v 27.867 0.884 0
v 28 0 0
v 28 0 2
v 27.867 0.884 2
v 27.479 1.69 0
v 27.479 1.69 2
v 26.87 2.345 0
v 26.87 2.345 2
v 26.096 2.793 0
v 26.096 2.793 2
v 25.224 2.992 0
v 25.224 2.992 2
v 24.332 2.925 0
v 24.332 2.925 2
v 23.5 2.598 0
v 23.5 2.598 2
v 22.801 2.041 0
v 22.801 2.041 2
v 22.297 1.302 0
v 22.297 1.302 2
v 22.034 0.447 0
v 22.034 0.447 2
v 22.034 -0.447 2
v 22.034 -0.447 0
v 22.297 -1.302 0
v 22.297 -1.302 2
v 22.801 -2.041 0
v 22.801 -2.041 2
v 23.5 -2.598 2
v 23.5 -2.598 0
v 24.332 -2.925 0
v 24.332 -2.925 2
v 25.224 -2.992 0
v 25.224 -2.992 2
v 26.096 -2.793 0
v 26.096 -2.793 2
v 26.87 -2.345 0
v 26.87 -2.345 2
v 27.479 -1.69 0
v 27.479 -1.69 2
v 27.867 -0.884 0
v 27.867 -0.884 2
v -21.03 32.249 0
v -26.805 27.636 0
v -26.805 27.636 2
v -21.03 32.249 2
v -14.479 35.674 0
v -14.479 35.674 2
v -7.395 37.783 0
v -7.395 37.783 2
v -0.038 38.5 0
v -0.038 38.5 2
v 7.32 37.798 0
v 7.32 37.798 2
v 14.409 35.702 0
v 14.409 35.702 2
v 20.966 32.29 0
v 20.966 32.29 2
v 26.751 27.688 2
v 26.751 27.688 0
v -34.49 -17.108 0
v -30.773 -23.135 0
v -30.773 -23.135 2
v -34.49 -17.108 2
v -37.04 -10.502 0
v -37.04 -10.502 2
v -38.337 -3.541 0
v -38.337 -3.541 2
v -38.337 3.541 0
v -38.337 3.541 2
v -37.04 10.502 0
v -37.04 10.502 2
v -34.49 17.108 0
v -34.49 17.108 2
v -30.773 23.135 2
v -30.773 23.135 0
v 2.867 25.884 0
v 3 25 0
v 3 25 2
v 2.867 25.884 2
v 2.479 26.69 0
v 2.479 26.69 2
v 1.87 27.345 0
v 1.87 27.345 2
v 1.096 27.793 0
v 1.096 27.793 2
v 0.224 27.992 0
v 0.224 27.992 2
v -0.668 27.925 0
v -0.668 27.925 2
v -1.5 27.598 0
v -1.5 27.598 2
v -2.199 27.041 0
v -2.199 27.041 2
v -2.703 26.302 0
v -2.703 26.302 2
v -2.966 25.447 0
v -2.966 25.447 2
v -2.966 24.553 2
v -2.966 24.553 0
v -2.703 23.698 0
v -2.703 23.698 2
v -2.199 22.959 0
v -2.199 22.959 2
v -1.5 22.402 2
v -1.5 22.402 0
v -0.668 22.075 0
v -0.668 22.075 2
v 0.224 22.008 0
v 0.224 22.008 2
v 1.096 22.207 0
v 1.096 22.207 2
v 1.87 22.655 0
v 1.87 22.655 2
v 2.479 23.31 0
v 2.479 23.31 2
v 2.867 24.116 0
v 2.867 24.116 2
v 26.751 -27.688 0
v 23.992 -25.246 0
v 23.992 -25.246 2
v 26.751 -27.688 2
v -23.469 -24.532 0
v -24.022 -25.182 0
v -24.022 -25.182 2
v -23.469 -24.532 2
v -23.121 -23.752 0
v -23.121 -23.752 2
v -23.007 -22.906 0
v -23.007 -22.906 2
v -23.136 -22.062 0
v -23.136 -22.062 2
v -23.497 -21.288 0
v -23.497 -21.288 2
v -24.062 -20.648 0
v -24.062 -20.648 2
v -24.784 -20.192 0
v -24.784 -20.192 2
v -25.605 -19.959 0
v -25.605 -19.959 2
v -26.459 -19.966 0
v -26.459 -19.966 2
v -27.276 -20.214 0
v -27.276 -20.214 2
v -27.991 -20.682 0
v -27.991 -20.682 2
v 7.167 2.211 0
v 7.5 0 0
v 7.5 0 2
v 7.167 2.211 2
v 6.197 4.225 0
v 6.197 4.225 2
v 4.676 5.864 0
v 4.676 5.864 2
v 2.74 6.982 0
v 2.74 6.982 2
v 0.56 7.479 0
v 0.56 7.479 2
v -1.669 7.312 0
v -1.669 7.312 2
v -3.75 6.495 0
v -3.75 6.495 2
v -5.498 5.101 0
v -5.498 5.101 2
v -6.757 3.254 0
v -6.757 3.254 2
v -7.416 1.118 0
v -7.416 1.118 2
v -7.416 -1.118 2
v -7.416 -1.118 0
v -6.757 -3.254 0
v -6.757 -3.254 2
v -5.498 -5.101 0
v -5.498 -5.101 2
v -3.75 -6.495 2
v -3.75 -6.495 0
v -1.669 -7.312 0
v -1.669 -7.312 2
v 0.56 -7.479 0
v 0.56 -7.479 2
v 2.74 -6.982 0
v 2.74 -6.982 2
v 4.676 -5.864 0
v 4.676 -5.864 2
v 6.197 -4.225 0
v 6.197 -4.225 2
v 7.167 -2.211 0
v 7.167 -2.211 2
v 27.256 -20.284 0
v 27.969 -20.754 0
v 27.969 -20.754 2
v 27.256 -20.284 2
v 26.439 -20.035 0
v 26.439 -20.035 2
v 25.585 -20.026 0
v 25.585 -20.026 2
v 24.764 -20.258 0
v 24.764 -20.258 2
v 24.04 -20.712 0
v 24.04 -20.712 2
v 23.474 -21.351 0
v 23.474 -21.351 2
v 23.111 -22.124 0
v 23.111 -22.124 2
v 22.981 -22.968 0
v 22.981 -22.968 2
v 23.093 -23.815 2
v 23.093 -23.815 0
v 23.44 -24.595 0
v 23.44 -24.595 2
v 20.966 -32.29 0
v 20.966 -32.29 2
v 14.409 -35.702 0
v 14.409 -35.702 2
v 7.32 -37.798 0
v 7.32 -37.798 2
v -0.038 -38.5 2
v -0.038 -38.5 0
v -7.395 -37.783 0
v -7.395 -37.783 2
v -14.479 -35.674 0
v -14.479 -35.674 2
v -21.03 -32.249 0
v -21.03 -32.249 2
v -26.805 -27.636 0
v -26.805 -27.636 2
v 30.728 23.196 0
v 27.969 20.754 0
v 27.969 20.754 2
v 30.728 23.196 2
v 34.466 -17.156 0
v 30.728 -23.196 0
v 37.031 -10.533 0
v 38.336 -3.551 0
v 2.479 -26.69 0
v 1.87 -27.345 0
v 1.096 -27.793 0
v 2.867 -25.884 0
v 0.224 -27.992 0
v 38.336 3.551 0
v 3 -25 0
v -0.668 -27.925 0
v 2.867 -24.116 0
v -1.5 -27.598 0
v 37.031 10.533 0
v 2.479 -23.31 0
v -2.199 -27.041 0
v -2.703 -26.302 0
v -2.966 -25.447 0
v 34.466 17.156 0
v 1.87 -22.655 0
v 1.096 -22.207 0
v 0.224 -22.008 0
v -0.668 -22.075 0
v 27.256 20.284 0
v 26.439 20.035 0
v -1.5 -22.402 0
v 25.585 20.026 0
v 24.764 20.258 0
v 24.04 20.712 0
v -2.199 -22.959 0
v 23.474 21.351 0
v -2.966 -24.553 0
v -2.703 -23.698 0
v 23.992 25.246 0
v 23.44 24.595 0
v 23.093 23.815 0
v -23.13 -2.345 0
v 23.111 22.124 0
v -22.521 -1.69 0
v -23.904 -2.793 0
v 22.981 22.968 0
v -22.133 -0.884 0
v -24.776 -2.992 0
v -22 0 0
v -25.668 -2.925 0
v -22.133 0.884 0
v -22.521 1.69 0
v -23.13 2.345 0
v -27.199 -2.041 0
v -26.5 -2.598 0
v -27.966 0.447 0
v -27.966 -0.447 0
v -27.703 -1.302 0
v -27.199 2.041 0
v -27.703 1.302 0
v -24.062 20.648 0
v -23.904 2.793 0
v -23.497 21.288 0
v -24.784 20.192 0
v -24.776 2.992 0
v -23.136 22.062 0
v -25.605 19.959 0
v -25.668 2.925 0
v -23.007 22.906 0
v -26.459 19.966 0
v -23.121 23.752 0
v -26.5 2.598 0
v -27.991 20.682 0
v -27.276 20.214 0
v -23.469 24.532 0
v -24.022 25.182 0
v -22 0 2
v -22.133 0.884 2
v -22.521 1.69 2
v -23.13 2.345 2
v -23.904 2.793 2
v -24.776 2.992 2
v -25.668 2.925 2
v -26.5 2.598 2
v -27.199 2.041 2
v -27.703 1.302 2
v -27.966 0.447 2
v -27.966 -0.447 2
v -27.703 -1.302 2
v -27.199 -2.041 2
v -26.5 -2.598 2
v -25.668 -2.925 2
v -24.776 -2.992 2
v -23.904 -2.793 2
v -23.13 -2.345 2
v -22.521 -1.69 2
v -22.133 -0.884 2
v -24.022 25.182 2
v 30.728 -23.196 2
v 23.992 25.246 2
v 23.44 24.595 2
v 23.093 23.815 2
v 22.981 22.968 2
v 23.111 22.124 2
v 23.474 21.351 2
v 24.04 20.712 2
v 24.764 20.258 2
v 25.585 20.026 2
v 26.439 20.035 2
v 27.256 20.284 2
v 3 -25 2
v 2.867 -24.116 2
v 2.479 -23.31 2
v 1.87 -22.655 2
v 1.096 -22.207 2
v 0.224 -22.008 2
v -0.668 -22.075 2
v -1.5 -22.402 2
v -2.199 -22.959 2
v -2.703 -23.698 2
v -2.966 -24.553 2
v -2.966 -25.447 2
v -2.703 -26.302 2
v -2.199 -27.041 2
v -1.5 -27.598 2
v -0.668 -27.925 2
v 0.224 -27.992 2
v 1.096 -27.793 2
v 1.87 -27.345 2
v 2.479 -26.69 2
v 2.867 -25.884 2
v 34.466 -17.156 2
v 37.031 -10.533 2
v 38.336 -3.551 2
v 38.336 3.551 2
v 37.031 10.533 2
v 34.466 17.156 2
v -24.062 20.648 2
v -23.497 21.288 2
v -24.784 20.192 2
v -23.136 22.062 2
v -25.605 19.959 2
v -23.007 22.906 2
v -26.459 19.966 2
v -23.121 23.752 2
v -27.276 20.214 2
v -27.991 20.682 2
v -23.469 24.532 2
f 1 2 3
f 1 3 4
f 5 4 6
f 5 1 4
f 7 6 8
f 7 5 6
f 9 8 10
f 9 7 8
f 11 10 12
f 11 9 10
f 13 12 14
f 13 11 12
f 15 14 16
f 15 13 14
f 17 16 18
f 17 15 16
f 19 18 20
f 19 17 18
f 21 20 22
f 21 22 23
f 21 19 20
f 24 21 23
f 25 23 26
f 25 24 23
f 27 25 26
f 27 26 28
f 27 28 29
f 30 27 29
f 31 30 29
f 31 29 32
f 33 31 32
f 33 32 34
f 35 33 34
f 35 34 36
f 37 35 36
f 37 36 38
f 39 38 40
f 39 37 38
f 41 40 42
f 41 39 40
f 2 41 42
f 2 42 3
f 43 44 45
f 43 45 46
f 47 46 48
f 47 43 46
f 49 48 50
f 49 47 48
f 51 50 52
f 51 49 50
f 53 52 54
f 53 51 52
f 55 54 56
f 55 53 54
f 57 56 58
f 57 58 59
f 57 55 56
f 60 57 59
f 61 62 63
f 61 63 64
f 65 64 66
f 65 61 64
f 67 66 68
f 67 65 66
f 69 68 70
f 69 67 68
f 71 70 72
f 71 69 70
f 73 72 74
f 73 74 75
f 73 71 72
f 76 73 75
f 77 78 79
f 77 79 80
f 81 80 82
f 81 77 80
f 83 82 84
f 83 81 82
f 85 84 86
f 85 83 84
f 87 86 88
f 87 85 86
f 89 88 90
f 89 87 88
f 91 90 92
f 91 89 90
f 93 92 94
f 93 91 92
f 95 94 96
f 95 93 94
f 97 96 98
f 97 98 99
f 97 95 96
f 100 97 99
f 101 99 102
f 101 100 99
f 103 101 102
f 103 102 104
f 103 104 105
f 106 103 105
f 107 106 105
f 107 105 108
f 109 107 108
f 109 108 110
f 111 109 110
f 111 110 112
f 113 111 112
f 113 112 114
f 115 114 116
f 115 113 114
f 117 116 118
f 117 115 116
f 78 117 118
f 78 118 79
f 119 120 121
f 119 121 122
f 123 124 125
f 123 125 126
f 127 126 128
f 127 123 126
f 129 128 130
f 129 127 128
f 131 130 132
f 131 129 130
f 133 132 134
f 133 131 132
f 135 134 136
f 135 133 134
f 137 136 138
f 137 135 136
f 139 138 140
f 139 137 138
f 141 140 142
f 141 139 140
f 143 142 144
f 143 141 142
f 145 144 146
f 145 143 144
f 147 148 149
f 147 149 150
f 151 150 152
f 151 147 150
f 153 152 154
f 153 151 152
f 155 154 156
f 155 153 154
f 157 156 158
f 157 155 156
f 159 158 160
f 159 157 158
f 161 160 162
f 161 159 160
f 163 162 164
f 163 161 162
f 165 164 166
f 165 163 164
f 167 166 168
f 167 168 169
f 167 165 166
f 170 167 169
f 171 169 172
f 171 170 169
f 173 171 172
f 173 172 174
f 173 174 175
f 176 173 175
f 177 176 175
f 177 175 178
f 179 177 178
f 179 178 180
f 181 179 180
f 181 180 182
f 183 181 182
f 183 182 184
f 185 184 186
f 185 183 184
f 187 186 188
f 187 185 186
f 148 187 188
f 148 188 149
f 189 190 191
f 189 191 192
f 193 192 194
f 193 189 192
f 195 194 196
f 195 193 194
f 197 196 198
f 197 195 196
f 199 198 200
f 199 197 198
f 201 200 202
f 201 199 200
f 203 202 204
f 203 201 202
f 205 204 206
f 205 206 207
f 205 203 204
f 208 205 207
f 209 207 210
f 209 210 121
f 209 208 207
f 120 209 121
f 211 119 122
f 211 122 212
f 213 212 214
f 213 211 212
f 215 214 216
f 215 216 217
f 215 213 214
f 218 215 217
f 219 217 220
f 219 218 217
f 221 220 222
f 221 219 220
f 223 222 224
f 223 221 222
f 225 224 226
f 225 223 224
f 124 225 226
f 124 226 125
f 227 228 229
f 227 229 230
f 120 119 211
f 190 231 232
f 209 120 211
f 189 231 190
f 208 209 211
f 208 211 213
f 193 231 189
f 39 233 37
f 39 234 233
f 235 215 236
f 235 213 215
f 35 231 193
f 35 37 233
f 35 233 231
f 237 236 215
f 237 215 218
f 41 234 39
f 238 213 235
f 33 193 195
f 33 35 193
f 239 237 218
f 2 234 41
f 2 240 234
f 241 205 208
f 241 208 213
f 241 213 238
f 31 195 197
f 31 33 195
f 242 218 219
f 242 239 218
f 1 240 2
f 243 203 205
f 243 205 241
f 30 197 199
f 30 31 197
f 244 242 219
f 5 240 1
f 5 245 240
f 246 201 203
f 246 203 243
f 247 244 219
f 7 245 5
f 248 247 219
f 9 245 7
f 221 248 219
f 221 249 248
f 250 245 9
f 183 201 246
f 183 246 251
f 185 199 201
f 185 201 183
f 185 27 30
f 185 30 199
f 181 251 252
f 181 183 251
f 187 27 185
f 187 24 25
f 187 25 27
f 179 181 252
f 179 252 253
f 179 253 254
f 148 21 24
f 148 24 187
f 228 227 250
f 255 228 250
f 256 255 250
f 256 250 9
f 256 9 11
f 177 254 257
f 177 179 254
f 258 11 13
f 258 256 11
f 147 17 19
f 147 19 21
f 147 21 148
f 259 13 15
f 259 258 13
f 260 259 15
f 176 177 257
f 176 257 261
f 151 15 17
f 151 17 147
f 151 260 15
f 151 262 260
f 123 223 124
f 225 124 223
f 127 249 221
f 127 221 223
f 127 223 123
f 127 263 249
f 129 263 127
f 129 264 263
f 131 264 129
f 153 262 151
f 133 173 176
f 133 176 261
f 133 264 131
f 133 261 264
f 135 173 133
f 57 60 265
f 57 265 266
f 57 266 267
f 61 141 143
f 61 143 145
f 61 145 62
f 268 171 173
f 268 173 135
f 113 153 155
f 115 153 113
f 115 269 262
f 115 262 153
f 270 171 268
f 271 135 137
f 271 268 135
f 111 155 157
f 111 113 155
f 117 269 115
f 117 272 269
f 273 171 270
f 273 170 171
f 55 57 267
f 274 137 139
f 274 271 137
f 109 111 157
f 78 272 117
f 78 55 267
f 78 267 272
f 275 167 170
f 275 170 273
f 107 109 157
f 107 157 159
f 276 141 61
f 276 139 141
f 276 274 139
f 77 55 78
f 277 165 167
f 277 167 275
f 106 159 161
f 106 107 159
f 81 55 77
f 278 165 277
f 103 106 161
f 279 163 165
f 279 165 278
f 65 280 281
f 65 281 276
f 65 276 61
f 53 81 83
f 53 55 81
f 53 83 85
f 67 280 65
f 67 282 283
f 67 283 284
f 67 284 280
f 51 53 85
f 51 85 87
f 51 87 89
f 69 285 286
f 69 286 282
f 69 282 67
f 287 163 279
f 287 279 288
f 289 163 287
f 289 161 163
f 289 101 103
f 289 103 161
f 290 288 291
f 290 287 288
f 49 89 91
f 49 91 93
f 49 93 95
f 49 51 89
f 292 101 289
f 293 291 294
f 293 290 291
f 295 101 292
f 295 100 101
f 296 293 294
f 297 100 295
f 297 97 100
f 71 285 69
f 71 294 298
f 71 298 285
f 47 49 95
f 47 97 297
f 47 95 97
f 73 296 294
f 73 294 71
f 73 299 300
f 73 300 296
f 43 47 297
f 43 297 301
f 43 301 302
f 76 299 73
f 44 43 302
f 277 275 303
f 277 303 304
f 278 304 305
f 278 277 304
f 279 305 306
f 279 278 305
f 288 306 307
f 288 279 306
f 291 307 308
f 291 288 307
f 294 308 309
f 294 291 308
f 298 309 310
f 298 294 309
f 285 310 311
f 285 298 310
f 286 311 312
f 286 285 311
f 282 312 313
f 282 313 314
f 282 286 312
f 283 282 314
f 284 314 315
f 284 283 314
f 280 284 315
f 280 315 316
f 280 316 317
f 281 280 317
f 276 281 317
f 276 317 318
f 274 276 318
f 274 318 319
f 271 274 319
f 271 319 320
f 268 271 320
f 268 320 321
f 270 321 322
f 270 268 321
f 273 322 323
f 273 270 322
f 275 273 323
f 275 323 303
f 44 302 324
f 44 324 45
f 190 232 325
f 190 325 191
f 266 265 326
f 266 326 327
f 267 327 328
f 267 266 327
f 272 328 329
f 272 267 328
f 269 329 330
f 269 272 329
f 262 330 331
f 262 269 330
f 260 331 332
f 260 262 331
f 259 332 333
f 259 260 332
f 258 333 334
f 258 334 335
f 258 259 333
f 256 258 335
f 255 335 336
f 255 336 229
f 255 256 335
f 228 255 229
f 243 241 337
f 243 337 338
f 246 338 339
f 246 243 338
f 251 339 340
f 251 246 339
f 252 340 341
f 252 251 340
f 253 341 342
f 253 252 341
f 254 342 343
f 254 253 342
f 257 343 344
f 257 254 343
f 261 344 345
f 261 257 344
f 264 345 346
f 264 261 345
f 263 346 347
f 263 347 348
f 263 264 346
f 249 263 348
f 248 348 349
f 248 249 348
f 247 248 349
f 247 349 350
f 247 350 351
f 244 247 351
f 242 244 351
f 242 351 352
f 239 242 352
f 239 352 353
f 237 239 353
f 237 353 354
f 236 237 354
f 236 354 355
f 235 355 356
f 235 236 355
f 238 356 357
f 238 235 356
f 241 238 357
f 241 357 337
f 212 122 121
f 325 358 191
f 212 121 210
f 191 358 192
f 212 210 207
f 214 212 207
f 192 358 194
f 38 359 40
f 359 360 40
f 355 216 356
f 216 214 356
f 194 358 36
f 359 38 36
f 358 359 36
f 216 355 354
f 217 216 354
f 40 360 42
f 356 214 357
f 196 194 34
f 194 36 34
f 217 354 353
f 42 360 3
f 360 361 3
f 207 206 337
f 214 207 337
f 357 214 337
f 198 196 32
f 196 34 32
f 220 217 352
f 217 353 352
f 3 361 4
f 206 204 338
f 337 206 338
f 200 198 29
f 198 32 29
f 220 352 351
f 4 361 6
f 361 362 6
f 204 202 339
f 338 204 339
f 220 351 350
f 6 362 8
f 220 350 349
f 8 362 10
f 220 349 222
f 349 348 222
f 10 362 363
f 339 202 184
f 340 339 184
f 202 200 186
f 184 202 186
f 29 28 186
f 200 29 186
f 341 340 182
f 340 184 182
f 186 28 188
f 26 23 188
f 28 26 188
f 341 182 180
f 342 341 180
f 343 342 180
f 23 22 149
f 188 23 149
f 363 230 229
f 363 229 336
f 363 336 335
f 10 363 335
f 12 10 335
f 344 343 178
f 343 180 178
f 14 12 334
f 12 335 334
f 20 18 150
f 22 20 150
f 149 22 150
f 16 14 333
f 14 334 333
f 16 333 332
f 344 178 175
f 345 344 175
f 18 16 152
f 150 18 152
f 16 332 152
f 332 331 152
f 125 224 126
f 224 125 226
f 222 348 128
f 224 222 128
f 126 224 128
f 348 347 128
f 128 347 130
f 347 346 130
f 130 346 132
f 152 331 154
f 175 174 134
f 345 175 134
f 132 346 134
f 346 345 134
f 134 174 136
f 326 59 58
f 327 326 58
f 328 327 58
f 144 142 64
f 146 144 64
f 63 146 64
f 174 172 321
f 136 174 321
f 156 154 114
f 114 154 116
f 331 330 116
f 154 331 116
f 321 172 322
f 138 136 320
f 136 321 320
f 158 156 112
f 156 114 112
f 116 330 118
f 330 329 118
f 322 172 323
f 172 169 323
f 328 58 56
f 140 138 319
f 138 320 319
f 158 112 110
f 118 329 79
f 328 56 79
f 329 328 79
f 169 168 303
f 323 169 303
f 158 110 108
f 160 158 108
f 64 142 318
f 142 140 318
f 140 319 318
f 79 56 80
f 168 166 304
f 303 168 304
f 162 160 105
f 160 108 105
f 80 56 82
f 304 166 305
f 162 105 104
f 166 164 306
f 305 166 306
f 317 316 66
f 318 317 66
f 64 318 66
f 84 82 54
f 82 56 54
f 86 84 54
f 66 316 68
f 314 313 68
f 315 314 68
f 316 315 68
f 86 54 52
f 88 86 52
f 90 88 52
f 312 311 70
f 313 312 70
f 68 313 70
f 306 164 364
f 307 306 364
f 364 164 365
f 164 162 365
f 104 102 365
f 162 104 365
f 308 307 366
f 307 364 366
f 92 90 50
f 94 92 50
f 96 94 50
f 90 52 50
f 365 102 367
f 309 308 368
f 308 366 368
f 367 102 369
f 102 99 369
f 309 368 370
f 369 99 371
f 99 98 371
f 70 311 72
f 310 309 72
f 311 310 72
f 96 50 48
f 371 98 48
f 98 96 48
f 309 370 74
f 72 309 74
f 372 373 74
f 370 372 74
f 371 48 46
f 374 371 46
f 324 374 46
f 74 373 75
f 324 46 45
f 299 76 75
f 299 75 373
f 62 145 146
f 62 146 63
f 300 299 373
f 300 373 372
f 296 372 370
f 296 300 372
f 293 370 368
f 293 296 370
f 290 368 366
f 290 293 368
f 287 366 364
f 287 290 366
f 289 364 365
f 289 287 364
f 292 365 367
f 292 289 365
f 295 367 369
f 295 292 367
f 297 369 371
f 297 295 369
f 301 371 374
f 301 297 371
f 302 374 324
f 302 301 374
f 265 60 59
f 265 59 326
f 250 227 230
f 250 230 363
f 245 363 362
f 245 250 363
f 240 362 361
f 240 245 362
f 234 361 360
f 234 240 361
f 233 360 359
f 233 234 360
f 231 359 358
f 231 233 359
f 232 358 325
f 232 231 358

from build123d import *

# Parameters (mm, degrees)
MODEL_R             = 7.5
MODEL_R_2           = 3
BOSS_EXTRUDE1_DEPTH = 2


with BuildPart() as part:
    # Model → Boss-Extrude1 (new body)
    with BuildSketch(Plane.XY):
        with BuildLine():
            Line((30.727892071, -23.195832576), (27.969309055, -20.753740651))
            ThreePointArc((27.969309055, -20.753740651), (23.734502764, -21.011453059), (23.992215172, -25.246259349))
            Line((23.992215172, -25.246259349), (26.750798188, -27.688351274))
            ThreePointArc((26.750798188, -27.688351274), (-0.037885337, -38.49998136), (-26.805238954, -27.635650248))
            Line((-26.805238954, -27.635650248), (-24.022447477, -25.18187917))
            ThreePointArc((-24.022447477, -25.18187917), (-23.756401179, -20.947588277), (-27.990692072, -20.68154198))
            Line((-27.990692072, -20.68154198), (-30.773483549, -23.135313057))
            ThreePointArc((-30.773483549, -23.135313057), (-38.5, 0), (-30.773483549, 23.135313057))
            Line((-30.773483549, 23.135313057), (-27.990692072, 20.68154198))
            ThreePointArc((-27.990692072, 20.68154198), (-23.756401179, 20.947588277), (-24.022447477, 25.18187917))
            Line((-24.022447477, 25.18187917), (-26.805238954, 27.635650248))
            ThreePointArc((-26.805238954, 27.635650248), (-0.037885337, 38.49998136), (26.750798188, 27.688351274))
            Line((26.750798188, 27.688351274), (23.992215172, 25.246259349))
            ThreePointArc((23.992215172, 25.246259349), (23.734502764, 21.011453059), (27.969309055, 20.753740651))
            Line((27.969309055, 20.753740651), (30.727892071, 23.195832576))
            ThreePointArc((30.727892071, 23.195832576), (38.5, 0), (30.727892071, -23.195832576))
        make_face()
        Circle(MODEL_R, mode=Mode.SUBTRACT)
        with Locations((0, 25)):
            Circle(MODEL_R_2, mode=Mode.SUBTRACT)
        with Locations((25, 0)):
            Circle(MODEL_R_2, mode=Mode.SUBTRACT)
        with Locations((0, -25)):
            Circle(MODEL_R_2, mode=Mode.SUBTRACT)
        with Locations((-25, 0)):
            Circle(MODEL_R_2, mode=Mode.SUBTRACT)
    extrude(amount=BOSS_EXTRUDE1_DEPTH)


solid = part.part
